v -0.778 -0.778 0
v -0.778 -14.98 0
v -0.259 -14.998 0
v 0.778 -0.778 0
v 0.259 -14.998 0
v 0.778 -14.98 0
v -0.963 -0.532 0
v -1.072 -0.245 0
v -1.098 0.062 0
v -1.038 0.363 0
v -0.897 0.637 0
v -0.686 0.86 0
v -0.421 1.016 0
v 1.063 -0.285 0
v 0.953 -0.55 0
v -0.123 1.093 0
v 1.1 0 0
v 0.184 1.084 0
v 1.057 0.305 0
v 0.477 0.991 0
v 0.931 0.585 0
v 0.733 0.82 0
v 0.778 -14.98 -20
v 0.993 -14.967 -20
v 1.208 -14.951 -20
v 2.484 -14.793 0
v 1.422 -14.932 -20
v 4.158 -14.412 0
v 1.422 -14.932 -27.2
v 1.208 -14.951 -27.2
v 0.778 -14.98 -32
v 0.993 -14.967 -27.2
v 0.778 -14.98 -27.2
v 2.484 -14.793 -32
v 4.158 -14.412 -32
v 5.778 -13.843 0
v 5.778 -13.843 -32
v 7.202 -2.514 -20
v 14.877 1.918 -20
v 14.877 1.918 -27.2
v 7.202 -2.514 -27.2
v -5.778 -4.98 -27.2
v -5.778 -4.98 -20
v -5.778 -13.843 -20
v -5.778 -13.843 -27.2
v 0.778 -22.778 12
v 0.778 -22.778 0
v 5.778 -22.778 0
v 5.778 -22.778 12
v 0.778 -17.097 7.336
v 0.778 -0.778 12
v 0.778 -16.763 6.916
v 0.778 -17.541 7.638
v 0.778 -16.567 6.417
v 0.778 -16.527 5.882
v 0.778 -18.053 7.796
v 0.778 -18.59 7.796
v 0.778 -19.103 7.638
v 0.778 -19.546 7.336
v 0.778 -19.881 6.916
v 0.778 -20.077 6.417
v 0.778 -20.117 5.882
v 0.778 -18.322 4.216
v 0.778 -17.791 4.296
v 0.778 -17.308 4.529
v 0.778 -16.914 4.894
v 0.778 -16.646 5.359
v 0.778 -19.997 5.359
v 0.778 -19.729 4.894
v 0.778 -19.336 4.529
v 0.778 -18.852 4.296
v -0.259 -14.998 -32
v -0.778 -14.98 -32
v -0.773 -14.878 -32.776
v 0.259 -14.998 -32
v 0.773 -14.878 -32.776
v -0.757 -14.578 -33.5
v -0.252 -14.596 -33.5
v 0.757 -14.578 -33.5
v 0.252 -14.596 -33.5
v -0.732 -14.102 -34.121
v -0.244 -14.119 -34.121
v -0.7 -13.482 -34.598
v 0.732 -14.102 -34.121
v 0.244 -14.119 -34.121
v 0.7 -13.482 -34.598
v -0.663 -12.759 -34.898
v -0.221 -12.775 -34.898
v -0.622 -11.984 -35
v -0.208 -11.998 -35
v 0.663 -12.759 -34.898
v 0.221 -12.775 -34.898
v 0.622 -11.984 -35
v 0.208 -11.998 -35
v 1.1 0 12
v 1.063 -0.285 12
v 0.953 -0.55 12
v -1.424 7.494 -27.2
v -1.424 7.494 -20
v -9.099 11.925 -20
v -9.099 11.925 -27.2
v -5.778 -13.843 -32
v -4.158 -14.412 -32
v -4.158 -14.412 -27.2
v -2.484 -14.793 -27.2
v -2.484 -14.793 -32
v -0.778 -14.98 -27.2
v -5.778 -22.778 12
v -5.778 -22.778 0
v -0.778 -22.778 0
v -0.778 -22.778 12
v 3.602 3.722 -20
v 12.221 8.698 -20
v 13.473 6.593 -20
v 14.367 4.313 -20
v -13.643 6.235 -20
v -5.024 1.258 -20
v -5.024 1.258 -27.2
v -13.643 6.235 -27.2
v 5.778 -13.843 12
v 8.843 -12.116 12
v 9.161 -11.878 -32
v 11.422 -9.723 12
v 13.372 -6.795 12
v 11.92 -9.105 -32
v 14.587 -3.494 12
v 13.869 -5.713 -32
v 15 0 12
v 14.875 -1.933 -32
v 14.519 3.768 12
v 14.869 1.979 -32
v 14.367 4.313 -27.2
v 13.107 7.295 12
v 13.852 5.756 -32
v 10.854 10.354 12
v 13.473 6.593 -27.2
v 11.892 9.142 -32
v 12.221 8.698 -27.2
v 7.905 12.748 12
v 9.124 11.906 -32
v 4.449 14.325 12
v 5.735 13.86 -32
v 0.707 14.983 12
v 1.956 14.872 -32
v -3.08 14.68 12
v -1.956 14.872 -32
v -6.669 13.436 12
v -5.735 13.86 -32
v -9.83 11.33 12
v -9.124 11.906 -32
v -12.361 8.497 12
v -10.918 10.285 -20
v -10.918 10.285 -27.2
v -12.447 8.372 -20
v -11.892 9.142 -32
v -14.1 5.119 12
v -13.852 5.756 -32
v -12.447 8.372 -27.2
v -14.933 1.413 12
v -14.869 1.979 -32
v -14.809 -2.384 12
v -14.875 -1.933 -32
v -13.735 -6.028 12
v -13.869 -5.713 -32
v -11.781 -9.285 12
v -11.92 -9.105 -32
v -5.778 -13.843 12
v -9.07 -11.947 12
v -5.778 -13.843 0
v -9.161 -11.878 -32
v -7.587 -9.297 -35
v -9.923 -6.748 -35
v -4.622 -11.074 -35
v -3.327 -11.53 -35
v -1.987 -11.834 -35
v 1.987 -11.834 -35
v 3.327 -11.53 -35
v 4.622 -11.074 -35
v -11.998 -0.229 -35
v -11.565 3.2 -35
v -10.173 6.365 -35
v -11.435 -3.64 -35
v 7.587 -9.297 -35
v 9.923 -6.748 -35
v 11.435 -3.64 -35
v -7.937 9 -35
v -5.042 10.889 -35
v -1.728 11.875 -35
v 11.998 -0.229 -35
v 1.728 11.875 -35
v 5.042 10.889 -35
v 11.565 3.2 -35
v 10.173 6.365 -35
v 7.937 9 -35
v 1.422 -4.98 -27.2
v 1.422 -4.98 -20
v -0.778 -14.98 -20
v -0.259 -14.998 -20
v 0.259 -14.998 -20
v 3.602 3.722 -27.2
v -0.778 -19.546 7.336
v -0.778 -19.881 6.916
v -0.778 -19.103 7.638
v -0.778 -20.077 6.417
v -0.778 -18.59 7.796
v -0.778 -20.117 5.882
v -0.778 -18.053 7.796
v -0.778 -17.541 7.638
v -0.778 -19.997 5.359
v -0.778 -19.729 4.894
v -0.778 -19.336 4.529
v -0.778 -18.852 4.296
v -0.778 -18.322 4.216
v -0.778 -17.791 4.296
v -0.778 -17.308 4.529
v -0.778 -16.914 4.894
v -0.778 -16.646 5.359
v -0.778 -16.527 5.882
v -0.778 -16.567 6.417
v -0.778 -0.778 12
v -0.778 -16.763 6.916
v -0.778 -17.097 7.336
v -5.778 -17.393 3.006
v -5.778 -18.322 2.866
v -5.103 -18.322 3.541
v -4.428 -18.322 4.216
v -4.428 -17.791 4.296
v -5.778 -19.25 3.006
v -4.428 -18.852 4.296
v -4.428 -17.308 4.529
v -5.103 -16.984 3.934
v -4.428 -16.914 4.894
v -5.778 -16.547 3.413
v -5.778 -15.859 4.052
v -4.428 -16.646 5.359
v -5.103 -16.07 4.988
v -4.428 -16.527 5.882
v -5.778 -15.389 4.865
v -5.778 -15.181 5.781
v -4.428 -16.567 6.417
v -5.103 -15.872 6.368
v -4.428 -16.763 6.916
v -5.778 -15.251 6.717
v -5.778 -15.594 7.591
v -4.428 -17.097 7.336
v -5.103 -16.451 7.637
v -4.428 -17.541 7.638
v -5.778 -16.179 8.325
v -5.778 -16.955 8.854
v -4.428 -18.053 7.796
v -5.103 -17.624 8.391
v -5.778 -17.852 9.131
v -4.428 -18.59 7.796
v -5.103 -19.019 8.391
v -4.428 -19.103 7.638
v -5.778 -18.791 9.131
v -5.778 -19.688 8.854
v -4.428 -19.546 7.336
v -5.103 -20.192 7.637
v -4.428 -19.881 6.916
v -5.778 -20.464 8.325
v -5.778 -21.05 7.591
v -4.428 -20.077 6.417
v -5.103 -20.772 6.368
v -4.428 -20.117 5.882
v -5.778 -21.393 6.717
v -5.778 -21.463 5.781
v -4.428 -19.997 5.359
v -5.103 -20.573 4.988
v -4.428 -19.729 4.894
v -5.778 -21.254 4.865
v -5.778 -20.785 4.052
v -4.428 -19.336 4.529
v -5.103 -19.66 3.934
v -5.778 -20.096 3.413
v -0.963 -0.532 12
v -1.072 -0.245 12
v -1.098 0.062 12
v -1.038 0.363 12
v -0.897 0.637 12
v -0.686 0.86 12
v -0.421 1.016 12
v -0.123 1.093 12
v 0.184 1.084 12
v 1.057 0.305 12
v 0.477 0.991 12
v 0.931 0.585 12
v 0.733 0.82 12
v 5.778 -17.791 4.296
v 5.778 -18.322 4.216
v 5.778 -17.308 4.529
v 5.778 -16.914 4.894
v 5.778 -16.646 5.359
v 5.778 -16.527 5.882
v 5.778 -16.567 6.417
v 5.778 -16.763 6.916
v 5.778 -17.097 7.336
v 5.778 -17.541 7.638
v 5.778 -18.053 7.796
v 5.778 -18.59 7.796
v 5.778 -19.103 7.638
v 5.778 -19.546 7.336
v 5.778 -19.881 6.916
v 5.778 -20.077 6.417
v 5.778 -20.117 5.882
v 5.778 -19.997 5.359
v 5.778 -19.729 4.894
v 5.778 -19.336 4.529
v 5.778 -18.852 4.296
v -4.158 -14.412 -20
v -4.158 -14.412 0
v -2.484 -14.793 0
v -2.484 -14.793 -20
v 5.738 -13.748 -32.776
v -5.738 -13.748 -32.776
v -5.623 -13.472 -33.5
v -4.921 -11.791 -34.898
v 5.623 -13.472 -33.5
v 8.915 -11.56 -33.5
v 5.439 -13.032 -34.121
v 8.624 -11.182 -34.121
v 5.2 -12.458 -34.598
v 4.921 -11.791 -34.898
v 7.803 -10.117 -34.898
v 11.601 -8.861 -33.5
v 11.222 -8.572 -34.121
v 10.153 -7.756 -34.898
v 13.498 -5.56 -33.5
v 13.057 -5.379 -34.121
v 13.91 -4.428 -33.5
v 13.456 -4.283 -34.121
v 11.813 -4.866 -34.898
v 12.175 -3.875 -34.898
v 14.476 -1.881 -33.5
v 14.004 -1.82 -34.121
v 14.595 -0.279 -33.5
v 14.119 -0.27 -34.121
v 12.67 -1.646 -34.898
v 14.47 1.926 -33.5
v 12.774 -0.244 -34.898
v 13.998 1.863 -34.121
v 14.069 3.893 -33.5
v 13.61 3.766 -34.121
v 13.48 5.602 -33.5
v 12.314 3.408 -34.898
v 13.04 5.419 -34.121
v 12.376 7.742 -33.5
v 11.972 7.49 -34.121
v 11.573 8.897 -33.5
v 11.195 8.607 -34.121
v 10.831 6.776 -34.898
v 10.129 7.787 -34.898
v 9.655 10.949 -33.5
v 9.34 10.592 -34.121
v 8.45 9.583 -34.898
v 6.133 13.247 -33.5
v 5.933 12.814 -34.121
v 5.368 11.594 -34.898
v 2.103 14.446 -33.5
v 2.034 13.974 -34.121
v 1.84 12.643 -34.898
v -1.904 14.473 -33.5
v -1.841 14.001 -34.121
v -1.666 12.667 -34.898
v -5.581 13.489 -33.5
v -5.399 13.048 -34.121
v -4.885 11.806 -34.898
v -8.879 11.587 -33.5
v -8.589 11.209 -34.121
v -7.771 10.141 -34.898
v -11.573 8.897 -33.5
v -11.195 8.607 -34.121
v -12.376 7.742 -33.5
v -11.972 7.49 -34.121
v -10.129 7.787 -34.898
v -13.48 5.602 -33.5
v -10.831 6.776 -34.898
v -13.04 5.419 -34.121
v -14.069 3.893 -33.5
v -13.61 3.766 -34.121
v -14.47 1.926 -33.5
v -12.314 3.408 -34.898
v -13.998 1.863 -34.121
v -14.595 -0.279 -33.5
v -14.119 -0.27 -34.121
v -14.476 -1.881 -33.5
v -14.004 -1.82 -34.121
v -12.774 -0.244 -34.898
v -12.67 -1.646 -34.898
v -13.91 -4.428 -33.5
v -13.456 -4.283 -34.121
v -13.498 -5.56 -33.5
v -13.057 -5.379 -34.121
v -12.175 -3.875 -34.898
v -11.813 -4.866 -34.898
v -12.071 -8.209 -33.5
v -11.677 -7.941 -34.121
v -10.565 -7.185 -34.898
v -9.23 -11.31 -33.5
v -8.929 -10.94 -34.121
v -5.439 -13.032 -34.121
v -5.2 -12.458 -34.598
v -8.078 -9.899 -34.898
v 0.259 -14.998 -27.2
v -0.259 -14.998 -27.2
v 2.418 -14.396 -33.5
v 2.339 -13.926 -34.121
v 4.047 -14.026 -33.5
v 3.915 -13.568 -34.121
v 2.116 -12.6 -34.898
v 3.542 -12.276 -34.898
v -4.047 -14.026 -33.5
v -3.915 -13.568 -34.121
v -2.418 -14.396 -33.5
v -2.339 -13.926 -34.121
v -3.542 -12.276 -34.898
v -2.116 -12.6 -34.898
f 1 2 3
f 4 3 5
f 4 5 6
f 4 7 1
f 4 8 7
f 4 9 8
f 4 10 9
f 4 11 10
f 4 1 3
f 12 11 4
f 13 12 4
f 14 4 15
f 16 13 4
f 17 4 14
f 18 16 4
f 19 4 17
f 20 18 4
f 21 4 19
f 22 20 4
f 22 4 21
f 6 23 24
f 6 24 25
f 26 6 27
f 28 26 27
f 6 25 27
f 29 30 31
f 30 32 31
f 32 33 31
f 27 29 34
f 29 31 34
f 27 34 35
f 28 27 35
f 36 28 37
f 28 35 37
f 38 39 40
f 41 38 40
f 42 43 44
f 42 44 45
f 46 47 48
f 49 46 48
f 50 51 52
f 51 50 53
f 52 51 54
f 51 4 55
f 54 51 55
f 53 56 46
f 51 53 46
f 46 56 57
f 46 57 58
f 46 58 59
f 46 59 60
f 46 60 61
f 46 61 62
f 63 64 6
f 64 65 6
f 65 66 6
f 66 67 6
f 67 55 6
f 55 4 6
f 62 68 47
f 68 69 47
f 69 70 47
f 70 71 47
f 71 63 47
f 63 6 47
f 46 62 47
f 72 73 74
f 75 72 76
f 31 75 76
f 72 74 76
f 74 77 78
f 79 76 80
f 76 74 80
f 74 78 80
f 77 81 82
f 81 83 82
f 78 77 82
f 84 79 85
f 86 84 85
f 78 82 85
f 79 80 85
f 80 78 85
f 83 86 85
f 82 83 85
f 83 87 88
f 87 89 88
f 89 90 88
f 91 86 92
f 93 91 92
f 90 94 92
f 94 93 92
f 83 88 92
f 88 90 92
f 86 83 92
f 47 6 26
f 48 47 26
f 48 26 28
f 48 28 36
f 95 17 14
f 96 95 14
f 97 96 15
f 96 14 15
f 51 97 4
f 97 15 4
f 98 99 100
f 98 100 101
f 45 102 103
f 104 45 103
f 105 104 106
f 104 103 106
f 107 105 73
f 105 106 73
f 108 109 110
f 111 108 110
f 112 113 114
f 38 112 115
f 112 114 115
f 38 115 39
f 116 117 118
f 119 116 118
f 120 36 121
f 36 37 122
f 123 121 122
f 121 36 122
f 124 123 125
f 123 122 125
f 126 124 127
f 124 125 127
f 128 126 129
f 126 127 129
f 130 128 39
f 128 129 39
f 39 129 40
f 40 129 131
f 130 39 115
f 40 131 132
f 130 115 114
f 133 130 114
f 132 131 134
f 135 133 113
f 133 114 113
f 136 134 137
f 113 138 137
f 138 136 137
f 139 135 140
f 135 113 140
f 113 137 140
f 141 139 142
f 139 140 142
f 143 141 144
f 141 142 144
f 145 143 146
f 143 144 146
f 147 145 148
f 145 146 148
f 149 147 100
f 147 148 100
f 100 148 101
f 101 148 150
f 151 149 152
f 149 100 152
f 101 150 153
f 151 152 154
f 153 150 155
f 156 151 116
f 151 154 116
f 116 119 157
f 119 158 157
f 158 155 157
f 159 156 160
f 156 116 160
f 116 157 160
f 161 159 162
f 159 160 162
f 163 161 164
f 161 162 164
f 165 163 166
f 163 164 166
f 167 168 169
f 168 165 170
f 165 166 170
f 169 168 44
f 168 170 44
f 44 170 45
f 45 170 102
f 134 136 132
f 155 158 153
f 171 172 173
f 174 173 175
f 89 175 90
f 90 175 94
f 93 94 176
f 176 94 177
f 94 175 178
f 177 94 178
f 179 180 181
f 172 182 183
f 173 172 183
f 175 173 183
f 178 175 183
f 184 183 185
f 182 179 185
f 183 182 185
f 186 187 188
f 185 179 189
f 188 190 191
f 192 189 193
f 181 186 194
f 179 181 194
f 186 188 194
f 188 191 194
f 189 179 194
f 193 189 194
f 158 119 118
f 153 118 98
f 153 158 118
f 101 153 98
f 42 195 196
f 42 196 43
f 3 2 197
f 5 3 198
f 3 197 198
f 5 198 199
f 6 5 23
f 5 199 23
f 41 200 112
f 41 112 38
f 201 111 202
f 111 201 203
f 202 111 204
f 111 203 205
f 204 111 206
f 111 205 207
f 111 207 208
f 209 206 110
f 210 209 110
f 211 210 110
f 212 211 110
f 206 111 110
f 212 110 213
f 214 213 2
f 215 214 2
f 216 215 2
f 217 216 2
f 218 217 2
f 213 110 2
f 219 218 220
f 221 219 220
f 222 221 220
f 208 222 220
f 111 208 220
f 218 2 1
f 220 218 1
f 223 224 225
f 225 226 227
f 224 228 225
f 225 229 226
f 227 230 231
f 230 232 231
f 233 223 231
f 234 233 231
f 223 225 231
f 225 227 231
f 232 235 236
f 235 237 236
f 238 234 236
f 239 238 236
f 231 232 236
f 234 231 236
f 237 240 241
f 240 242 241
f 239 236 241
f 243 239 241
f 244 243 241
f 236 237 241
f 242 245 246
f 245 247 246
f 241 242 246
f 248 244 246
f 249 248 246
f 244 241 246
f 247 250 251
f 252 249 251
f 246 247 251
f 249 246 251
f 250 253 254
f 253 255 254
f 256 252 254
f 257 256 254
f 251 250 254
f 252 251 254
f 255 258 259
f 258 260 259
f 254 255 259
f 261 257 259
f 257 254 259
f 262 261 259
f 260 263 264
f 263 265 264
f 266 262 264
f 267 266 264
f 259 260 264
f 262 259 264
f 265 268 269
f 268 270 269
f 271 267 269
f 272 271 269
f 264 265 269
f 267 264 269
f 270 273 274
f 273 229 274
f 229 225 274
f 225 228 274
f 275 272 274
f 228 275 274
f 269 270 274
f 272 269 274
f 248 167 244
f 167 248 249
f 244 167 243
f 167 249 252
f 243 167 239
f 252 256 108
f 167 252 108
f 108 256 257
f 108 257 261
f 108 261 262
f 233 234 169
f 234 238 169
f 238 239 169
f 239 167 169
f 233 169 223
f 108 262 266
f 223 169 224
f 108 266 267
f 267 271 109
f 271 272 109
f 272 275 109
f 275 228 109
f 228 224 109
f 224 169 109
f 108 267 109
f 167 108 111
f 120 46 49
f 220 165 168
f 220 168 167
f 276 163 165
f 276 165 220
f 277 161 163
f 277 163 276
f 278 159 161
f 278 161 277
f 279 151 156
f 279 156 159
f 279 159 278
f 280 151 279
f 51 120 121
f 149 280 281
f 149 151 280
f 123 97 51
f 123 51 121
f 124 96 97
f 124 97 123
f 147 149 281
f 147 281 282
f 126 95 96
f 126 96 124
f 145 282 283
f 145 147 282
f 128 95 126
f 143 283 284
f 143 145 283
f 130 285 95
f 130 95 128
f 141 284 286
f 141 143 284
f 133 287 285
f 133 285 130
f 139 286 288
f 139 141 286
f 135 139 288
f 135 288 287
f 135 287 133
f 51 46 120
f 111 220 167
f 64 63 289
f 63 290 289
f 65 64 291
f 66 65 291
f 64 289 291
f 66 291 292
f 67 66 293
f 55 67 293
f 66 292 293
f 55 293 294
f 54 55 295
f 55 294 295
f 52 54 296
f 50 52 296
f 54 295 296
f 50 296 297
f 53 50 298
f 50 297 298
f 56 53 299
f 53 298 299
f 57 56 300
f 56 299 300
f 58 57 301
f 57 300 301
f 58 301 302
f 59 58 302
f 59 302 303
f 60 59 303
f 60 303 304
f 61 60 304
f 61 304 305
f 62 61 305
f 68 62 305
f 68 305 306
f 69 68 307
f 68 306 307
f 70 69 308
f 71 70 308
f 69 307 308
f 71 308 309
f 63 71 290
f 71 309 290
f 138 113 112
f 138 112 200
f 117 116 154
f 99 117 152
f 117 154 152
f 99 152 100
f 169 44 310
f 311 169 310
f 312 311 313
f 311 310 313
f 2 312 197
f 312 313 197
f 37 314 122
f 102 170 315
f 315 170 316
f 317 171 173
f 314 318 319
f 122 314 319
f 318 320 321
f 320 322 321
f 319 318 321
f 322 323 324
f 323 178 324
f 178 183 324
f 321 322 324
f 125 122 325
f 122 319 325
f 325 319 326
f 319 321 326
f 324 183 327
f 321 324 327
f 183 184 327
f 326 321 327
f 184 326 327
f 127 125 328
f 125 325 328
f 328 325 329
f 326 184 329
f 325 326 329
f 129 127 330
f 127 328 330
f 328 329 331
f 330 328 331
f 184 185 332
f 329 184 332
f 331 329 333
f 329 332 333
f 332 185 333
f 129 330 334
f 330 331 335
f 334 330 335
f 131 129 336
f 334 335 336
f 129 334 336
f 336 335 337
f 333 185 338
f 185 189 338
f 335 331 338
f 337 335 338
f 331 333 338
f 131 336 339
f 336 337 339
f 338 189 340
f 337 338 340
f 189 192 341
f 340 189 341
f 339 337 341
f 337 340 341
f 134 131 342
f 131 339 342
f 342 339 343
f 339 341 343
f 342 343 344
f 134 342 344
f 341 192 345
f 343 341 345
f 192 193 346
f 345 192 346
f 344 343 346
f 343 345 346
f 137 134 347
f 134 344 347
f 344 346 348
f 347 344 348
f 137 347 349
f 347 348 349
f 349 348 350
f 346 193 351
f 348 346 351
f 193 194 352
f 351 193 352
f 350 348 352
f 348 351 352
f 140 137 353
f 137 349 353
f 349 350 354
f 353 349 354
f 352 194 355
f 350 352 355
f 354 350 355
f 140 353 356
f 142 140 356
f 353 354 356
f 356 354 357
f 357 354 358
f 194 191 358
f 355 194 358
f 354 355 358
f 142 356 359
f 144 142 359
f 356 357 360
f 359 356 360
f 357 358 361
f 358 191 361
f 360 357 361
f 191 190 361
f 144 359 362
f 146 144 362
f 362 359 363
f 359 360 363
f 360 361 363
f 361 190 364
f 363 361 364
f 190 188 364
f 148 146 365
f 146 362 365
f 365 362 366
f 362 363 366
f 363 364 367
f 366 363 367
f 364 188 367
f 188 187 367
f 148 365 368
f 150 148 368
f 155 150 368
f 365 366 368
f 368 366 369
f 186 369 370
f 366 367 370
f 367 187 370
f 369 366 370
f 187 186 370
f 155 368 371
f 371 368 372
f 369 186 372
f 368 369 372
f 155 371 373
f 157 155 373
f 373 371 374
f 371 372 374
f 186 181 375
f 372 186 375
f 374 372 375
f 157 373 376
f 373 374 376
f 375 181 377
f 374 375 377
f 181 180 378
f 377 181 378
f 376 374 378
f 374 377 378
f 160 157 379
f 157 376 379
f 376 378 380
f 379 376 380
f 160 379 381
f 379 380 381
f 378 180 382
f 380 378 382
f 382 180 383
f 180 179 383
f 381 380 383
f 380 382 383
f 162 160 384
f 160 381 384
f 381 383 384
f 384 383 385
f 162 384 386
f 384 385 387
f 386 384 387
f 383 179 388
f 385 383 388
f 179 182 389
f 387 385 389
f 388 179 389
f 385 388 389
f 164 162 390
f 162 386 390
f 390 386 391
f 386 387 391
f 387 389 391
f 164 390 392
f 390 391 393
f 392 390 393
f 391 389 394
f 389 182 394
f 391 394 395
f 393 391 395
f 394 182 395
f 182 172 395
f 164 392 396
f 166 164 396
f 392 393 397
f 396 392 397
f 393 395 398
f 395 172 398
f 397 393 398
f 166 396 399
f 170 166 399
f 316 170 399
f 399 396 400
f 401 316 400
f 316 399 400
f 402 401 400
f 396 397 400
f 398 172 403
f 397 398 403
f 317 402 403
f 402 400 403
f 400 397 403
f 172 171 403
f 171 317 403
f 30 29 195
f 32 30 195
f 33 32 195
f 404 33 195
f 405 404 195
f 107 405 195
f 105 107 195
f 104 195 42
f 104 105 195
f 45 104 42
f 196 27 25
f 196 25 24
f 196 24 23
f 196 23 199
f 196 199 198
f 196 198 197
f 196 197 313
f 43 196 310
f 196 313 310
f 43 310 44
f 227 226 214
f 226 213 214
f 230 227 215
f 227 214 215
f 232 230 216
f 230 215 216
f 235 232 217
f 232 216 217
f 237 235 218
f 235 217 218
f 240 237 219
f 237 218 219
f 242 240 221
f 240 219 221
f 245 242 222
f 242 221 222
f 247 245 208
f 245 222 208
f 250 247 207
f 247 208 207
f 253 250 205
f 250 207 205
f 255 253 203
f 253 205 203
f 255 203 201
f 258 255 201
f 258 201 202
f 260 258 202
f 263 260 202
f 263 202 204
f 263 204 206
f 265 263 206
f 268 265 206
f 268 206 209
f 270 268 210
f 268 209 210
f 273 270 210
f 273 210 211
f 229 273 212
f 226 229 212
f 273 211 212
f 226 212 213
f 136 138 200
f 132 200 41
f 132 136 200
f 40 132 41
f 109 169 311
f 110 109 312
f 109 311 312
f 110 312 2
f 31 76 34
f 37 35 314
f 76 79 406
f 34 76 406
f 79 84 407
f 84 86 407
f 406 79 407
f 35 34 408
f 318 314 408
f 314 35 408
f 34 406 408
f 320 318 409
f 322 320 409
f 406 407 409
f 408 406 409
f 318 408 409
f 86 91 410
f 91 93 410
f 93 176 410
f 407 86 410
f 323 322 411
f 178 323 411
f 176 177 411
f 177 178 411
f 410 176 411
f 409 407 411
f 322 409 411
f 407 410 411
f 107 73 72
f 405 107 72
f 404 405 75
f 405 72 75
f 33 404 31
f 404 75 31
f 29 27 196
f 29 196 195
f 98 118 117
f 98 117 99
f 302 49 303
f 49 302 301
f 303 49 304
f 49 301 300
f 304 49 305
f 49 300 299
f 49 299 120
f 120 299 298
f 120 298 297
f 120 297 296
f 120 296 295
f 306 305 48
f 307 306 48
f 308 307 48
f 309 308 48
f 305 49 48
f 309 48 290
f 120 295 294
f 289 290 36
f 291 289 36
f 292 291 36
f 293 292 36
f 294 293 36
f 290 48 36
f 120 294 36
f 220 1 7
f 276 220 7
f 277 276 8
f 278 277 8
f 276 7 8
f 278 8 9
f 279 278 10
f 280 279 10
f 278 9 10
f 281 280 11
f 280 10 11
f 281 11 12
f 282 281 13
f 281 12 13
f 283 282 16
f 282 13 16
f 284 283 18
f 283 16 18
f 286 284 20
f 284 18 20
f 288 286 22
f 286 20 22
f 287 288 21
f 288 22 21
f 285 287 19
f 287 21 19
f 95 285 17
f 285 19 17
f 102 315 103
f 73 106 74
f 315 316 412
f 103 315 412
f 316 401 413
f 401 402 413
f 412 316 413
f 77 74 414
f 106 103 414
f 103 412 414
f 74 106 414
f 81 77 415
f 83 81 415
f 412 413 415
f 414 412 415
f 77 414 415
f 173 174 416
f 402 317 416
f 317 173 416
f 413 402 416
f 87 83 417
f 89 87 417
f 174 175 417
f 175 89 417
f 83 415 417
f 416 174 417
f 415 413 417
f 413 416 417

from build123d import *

# Parameters (mm, degrees)
BOSS_EXTRUDE1_DEPTH                             = 12
BOSS_EXTRUDE2_START                             = -35
SKETCH1_4_R                                     = 15
BOSS_EXTRUDE2_DEPTH                             = 35
SKETCH4_W                                       = 7.2
SKETCH4_H                                       = 7.2
CUT_EXTRUDE1_DEPTH                              = 10
CIRPATTERN1_COUNT                               = 3
FILLET1_R                                       = 3
CSK_FOR_M3_OVAL_HEAD_MACHINE_SCREW1_D           = 3.6
CSK_FOR_M3_OVAL_HEAD_MACHINE_SCREW1_CSINK_D     = 6.3
CSK_FOR_M3_OVAL_HEAD_MACHINE_SCREW1_CSINK_ANGLE = 90


with BuildPart() as part:
    # Sketch1 → Boss-Extrude1 (new body)
    with BuildSketch(Plane.XY):
        with BuildLine():
            Line((-5.777817459, -22.777817459), (-0.777817459, -22.777817459))
            Line((-0.777817459, -22.777817459), (-0.777817459, -0.777817459))
            ThreePointArc((-0.777817459, -0.777817459), (0, 1.1), (0.777817459, -0.777817459))
            Line((0.777817459, -0.777817459), (0.777817459, -22.777817459))
            Line((0.777817459, -22.777817459), (5.777817459, -22.777817459))
            Line((5.777817459, -22.777817459), (5.777817459, -13.842572933))
            ThreePointArc((5.777817459, -13.842572933), (0, 15), (-5.777817459, -13.842572933))
            Line((-5.777817459, -13.842572933), (-5.777817459, -22.777817459))
        make_face()
    extrude(amount=BOSS_EXTRUDE1_DEPTH)

    # Sketch1<4> → Boss-Extrude2 (add)
    with BuildSketch(Plane.XY.offset(BOSS_EXTRUDE2_START)):
        Circle(SKETCH1_4_R)
    extrude(amount=BOSS_EXTRUDE2_DEPTH)

    # Sketch4 → Cut-Extrude1 (cut, symmetric)
    with BuildSketch(Plane(origin=(0, -14.979819759, 0), x_dir=(-1, 0, 0), z_dir=(0, -1, 0))):
        with Locations((2.177817459, 23.6)):
            Rectangle(SKETCH4_W, SKETCH4_H)
    cut_extrude1 = extrude(amount=CUT_EXTRUDE1_DEPTH, both=True, mode=Mode.SUBTRACT)

    # CirPattern1: Cut-Extrude1 ×3 about axis
    cirpattern1_axis = Axis((0, 0, 12), (0, 0, -1))
    for i in range(1, CIRPATTERN1_COUNT):
        add(cut_extrude1.rotate(cirpattern1_axis, i * 360 / CIRPATTERN1_COUNT), mode=Mode.SUBTRACT)

    # Fillet1
    fillet1_edges = [part.edges().sort_by_distance(p)[0] for p in [
        (-15, 0, -35),
    ]]
    fillet(fillet1_edges, radius=FILLET1_R)

    # CSK for M3 Oval Head Machine Screw1 (through all)
    with Locations(Plane.ZY.offset(5.777817459)):
        with Locations((6.016146397, -18.321749647)):
            CounterSinkHole(CSK_FOR_M3_OVAL_HEAD_MACHINE_SCREW1_D / 2, CSK_FOR_M3_OVAL_HEAD_MACHINE_SCREW1_CSINK_D / 2, counter_sink_angle=CSK_FOR_M3_OVAL_HEAD_MACHINE_SCREW1_CSINK_ANGLE)


solid = part.part
